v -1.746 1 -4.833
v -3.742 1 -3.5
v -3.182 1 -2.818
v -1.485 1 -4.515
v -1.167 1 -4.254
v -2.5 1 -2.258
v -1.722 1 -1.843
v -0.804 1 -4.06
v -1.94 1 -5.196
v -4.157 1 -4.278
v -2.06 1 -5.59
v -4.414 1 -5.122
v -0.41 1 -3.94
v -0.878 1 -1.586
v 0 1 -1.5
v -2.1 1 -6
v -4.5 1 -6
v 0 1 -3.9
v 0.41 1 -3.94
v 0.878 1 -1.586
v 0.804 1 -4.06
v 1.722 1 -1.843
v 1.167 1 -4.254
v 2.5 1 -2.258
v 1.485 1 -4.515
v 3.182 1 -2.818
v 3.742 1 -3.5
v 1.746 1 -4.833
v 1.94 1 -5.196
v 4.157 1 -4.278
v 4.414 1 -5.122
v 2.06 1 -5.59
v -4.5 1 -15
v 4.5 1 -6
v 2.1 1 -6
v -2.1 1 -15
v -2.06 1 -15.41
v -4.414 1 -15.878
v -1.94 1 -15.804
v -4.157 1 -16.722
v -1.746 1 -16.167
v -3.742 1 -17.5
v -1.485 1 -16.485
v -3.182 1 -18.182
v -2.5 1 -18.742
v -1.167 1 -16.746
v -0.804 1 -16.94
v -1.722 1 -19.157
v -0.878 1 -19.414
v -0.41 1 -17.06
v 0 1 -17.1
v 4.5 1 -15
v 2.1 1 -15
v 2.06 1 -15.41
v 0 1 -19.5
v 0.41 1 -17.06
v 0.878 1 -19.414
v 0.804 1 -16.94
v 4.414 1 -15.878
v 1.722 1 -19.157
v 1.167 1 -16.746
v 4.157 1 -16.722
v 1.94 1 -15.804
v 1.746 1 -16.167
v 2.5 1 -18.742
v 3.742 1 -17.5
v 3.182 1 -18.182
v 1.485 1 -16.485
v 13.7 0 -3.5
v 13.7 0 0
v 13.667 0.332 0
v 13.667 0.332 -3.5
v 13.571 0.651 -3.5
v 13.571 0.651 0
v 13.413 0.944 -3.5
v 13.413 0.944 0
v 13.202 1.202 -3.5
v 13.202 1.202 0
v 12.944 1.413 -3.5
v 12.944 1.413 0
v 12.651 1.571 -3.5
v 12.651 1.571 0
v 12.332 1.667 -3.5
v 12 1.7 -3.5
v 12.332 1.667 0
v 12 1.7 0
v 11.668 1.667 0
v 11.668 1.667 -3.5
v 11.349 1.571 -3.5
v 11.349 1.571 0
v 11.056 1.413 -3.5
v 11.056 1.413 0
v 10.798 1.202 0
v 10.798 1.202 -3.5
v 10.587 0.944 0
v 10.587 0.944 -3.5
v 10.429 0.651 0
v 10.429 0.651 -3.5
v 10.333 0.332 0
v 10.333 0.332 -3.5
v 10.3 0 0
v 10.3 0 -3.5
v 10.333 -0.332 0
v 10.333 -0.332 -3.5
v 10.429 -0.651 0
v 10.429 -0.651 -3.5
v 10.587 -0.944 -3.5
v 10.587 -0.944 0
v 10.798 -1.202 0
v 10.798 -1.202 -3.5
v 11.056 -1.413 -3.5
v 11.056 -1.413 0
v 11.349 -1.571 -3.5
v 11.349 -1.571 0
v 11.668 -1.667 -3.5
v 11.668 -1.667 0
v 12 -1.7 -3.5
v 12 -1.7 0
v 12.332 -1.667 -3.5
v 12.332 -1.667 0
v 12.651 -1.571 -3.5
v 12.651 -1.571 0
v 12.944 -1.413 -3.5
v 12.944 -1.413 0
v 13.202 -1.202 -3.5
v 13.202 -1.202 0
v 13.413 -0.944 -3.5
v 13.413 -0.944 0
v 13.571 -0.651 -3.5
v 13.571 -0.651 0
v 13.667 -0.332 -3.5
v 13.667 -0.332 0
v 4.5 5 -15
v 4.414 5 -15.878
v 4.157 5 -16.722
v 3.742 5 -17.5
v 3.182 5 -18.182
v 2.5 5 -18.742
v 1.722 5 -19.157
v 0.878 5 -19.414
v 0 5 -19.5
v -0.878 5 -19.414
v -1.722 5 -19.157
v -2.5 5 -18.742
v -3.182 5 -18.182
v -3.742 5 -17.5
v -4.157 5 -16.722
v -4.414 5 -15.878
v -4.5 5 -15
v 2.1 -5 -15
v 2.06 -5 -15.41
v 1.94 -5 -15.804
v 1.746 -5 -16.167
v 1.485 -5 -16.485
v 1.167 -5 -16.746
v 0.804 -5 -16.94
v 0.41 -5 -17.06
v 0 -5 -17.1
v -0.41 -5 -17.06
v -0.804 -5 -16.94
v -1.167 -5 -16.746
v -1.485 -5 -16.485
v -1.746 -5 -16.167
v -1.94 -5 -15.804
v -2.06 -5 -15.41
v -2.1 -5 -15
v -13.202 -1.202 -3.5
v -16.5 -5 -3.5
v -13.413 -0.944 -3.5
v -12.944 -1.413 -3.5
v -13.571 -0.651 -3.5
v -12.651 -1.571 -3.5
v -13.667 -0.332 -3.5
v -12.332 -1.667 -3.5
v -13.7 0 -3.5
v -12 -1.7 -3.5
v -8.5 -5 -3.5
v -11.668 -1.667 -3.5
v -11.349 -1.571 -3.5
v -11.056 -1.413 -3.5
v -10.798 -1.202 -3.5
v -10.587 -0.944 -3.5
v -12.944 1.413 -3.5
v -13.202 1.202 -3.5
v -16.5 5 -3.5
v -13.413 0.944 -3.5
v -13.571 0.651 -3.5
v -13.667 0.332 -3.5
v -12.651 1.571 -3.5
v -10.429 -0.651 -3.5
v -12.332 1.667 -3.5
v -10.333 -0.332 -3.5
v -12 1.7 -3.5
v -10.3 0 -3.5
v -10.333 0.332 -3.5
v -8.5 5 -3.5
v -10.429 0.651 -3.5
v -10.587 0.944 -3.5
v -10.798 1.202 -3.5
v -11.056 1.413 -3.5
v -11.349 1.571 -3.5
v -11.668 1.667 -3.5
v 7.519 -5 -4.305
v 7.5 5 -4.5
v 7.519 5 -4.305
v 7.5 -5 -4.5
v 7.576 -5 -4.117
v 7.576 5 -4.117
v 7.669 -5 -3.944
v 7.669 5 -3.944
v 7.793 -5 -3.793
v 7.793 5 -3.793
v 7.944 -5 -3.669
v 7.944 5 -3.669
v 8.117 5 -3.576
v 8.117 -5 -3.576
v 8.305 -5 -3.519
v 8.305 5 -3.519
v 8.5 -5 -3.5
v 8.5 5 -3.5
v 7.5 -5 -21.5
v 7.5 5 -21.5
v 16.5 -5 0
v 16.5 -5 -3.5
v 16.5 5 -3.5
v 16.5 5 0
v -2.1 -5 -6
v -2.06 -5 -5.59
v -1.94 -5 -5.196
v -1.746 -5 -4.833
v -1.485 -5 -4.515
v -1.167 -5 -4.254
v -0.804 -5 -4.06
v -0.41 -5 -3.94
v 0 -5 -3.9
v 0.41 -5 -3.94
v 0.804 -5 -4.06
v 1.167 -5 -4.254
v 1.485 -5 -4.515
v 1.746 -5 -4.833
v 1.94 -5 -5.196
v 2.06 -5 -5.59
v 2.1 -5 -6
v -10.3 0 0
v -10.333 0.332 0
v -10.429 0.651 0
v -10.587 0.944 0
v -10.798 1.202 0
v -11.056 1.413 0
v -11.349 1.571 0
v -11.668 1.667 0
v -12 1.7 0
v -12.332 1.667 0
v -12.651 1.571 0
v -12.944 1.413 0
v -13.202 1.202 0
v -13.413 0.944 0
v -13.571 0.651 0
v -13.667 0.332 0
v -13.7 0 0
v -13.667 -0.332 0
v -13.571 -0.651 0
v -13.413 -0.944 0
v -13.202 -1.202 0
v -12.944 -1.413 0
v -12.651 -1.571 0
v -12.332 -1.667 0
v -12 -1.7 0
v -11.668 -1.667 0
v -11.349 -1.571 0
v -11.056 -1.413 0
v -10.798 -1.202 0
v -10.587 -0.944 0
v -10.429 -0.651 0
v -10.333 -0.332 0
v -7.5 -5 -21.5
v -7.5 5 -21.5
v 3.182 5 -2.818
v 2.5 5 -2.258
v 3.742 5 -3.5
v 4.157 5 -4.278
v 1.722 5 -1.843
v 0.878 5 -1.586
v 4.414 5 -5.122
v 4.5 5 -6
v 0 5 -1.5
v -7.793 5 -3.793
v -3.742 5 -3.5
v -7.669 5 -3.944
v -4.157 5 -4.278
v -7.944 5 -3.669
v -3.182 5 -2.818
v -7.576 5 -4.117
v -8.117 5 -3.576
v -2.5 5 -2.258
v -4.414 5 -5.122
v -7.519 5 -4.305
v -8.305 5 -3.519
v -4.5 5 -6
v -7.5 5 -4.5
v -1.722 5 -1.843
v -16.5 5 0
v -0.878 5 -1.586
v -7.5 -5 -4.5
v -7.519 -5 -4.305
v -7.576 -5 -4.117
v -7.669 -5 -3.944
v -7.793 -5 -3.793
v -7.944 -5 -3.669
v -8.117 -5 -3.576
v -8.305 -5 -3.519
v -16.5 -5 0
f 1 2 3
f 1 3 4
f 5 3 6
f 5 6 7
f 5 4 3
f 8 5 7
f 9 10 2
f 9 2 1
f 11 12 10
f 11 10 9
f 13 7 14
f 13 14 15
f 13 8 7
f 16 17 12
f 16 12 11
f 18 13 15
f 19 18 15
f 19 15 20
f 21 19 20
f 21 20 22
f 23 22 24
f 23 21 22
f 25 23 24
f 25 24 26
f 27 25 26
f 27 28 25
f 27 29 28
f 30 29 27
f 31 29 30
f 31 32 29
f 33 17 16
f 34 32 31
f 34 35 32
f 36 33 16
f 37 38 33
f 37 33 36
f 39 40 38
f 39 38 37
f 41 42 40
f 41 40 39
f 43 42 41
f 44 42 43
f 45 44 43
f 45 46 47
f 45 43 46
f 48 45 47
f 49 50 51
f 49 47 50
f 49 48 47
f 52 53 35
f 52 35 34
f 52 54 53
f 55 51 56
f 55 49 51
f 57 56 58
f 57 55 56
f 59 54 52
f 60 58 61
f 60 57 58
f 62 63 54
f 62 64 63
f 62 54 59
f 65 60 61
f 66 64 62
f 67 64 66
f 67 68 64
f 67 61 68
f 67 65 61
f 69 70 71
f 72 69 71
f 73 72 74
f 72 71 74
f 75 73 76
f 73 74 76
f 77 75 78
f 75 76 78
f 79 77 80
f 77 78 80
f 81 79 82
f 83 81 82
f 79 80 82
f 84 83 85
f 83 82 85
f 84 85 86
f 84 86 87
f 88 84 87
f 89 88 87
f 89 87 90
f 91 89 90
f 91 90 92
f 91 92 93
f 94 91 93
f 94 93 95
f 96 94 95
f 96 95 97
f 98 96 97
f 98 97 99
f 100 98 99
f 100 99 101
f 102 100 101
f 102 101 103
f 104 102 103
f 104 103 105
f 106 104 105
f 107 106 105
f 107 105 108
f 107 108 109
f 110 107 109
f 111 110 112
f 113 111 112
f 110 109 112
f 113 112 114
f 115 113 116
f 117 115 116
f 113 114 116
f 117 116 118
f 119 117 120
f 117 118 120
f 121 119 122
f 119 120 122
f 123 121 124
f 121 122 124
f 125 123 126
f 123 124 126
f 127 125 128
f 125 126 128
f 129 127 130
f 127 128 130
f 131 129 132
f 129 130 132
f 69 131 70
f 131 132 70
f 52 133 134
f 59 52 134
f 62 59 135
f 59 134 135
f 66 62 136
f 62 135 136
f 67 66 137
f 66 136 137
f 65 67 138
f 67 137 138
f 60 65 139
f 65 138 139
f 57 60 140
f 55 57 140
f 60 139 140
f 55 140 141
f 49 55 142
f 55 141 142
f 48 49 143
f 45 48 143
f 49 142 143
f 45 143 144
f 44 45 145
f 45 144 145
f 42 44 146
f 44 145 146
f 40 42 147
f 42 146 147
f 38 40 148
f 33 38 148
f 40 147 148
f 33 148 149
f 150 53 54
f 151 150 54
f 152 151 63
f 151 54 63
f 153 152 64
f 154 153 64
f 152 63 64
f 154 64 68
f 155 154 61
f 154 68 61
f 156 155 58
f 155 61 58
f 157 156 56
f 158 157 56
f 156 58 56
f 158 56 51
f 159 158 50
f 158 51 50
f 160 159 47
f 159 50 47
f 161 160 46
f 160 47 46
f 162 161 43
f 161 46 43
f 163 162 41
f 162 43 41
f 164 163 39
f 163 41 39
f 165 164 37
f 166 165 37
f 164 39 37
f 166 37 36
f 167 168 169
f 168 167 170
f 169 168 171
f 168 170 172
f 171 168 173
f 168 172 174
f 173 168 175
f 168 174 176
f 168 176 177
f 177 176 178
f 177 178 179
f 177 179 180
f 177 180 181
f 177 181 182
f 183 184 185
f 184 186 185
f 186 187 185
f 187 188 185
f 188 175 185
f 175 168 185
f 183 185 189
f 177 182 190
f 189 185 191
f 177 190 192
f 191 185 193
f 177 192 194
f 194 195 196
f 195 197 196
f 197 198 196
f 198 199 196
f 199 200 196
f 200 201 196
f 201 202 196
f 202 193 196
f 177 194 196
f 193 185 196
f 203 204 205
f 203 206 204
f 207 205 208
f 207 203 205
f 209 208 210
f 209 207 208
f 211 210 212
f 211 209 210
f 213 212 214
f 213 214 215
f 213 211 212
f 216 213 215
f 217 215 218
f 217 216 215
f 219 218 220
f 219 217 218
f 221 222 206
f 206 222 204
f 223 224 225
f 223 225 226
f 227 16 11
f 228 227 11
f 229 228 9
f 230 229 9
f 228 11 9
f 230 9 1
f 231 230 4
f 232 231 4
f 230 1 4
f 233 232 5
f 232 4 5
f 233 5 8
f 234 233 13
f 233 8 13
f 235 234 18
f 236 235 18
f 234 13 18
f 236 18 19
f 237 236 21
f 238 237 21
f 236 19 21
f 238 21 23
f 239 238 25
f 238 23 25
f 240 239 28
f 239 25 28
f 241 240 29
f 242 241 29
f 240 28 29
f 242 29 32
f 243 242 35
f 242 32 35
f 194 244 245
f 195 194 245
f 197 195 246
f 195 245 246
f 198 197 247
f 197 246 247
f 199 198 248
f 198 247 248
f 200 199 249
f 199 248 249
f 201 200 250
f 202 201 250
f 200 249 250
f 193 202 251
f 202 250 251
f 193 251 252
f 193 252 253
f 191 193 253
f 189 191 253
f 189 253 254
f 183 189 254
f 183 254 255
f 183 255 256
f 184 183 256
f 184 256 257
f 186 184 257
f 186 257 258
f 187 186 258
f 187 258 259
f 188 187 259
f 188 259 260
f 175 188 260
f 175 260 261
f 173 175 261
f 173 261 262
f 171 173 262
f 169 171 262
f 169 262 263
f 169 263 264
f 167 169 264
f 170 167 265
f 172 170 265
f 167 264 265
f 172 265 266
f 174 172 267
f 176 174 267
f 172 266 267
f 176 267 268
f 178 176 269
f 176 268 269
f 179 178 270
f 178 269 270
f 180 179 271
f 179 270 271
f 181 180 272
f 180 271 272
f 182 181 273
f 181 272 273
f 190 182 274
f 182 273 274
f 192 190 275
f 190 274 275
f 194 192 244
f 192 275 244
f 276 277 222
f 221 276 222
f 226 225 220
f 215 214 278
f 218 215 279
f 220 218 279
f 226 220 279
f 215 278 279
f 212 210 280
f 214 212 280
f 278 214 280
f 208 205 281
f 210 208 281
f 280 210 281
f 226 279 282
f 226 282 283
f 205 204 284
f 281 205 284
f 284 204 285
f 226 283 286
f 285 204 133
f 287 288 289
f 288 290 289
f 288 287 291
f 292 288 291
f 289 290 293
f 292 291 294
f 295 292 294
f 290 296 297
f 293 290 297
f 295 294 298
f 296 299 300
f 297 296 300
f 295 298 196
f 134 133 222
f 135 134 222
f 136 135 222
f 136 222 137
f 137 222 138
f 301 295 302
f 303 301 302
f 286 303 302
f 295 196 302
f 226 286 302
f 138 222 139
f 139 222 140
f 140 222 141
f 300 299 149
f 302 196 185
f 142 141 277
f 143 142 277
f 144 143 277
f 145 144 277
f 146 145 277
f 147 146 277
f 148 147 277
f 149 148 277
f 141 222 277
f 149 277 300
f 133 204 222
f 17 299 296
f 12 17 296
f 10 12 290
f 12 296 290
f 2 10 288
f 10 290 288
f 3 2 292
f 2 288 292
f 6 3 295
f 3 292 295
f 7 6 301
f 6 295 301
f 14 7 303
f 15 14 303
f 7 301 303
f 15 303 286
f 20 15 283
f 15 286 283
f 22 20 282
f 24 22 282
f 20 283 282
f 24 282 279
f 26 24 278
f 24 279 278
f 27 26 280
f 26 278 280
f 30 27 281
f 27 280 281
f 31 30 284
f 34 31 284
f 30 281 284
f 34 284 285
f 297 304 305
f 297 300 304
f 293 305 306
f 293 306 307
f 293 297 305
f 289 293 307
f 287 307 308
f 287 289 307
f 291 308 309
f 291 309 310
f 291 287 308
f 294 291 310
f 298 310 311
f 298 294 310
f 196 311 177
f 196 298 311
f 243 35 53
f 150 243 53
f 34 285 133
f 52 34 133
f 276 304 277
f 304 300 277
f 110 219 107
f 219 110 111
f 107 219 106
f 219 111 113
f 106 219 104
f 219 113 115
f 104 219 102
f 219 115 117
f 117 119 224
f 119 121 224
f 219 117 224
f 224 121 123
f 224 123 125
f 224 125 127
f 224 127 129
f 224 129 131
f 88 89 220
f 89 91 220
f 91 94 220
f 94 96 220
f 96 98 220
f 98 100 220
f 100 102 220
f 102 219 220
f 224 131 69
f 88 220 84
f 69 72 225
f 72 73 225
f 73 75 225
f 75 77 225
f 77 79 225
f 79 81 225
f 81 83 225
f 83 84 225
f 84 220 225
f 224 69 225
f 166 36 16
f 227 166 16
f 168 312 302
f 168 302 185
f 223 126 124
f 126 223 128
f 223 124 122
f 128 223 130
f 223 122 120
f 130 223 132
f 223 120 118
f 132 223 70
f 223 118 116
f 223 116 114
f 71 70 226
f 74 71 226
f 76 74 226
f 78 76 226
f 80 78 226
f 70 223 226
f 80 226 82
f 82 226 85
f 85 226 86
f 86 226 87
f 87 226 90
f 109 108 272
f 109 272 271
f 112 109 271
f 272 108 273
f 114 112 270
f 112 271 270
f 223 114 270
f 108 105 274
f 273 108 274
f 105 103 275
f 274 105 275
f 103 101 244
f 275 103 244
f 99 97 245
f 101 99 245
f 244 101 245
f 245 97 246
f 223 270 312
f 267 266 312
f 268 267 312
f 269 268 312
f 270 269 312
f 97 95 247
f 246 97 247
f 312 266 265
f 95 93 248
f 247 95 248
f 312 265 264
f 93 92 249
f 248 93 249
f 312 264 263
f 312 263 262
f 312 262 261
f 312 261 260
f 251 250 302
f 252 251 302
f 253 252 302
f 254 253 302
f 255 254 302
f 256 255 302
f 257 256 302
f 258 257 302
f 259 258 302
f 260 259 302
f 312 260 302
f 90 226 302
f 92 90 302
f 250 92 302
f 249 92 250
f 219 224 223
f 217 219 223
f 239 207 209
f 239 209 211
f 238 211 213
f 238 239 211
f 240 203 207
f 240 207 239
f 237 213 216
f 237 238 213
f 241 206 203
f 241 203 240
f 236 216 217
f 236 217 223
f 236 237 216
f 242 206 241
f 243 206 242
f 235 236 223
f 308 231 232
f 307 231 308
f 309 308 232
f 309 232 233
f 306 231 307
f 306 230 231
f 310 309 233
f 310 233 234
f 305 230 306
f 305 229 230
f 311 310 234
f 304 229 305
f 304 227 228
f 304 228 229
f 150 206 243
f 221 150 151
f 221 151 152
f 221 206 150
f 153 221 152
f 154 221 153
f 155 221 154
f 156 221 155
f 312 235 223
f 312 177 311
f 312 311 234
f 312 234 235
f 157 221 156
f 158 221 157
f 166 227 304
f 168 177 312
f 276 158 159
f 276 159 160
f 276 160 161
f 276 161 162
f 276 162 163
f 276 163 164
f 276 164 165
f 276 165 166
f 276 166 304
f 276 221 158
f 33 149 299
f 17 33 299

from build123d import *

# Parameters (mm, degrees)
BOSS_EXTRUDE1_DEPTH  = 5
CUT_EXTRUDE1_DEPTH   = 4
CUT_EXTRUDE2_DEPTH   = 29.887713651
M3_CLEARANCE_HOLE1_D = 3.4
FILLET1_R            = 1


with BuildPart() as part:
    # Sketch1 → Boss-Extrude1 (new, symmetric)
    with BuildSketch(Plane(origin=(0, 0, 0), x_dir=(1, 0, 0), z_dir=(0, 1, 0))):
        Polygon((-7.5, 21.5), (7.5, 21.5), (7.5, 3.5), (16.5, 3.5), (16.5, 0), (-16.5, 0), (-16.5, 3.5), (-7.5, 3.5), align=None)
    extrude(amount=BOSS_EXTRUDE1_DEPTH, both=True)

    # Sketch3 → Cut-Extrude1 (cut)
    with BuildSketch(Plane(origin=(0, 5, 0), x_dir=(1, 0, 0), z_dir=(0, 1, 0))):
        with BuildLine():
            Line((4.5, 6), (4.5, 15))
            ThreePointArc((4.5, 15), (0, 19.5), (-4.5, 15))
            Line((-4.5, 15), (-4.5, 6))
            ThreePointArc((-4.5, 6), (0, 1.5), (4.5, 6))
        make_face()
    extrude(amount=-CUT_EXTRUDE1_DEPTH, mode=Mode.SUBTRACT)

    # Sketch4 → Cut-Extrude2 (cut, through all)
    with BuildSketch(Plane(origin=(0, 5, 0), x_dir=(1, 0, 0), z_dir=(0, 1, 0))):
        with BuildLine():
            Line((2.1, 6), (2.1, 15))
            ThreePointArc((2.1, 15), (0, 17.1), (-2.1, 15))
            Line((-2.1, 15), (-2.1, 6))
            ThreePointArc((-2.1, 6), (0, 3.9), (2.1, 6))
        make_face()
    extrude(amount=-CUT_EXTRUDE2_DEPTH, mode=Mode.SUBTRACT)

    # M3 Clearance Hole1 (through all)
    with Locations(Plane(origin=(0, 0, -3.5), x_dir=(-1, 0, 0), z_dir=(0, 0, -1))):
        with Locations((-12, 0), (12, 0)):
            Hole(M3_CLEARANCE_HOLE1_D / 2)

    # Fillet1
    fillet1_edges = [part.edges().sort_by_distance(p)[0] for p in [
        (-7.5, 0, -3.5),
        (7.5, 0, -3.5),
    ]]
    fillet(fillet1_edges, radius=FILLET1_R)


solid = part.part
